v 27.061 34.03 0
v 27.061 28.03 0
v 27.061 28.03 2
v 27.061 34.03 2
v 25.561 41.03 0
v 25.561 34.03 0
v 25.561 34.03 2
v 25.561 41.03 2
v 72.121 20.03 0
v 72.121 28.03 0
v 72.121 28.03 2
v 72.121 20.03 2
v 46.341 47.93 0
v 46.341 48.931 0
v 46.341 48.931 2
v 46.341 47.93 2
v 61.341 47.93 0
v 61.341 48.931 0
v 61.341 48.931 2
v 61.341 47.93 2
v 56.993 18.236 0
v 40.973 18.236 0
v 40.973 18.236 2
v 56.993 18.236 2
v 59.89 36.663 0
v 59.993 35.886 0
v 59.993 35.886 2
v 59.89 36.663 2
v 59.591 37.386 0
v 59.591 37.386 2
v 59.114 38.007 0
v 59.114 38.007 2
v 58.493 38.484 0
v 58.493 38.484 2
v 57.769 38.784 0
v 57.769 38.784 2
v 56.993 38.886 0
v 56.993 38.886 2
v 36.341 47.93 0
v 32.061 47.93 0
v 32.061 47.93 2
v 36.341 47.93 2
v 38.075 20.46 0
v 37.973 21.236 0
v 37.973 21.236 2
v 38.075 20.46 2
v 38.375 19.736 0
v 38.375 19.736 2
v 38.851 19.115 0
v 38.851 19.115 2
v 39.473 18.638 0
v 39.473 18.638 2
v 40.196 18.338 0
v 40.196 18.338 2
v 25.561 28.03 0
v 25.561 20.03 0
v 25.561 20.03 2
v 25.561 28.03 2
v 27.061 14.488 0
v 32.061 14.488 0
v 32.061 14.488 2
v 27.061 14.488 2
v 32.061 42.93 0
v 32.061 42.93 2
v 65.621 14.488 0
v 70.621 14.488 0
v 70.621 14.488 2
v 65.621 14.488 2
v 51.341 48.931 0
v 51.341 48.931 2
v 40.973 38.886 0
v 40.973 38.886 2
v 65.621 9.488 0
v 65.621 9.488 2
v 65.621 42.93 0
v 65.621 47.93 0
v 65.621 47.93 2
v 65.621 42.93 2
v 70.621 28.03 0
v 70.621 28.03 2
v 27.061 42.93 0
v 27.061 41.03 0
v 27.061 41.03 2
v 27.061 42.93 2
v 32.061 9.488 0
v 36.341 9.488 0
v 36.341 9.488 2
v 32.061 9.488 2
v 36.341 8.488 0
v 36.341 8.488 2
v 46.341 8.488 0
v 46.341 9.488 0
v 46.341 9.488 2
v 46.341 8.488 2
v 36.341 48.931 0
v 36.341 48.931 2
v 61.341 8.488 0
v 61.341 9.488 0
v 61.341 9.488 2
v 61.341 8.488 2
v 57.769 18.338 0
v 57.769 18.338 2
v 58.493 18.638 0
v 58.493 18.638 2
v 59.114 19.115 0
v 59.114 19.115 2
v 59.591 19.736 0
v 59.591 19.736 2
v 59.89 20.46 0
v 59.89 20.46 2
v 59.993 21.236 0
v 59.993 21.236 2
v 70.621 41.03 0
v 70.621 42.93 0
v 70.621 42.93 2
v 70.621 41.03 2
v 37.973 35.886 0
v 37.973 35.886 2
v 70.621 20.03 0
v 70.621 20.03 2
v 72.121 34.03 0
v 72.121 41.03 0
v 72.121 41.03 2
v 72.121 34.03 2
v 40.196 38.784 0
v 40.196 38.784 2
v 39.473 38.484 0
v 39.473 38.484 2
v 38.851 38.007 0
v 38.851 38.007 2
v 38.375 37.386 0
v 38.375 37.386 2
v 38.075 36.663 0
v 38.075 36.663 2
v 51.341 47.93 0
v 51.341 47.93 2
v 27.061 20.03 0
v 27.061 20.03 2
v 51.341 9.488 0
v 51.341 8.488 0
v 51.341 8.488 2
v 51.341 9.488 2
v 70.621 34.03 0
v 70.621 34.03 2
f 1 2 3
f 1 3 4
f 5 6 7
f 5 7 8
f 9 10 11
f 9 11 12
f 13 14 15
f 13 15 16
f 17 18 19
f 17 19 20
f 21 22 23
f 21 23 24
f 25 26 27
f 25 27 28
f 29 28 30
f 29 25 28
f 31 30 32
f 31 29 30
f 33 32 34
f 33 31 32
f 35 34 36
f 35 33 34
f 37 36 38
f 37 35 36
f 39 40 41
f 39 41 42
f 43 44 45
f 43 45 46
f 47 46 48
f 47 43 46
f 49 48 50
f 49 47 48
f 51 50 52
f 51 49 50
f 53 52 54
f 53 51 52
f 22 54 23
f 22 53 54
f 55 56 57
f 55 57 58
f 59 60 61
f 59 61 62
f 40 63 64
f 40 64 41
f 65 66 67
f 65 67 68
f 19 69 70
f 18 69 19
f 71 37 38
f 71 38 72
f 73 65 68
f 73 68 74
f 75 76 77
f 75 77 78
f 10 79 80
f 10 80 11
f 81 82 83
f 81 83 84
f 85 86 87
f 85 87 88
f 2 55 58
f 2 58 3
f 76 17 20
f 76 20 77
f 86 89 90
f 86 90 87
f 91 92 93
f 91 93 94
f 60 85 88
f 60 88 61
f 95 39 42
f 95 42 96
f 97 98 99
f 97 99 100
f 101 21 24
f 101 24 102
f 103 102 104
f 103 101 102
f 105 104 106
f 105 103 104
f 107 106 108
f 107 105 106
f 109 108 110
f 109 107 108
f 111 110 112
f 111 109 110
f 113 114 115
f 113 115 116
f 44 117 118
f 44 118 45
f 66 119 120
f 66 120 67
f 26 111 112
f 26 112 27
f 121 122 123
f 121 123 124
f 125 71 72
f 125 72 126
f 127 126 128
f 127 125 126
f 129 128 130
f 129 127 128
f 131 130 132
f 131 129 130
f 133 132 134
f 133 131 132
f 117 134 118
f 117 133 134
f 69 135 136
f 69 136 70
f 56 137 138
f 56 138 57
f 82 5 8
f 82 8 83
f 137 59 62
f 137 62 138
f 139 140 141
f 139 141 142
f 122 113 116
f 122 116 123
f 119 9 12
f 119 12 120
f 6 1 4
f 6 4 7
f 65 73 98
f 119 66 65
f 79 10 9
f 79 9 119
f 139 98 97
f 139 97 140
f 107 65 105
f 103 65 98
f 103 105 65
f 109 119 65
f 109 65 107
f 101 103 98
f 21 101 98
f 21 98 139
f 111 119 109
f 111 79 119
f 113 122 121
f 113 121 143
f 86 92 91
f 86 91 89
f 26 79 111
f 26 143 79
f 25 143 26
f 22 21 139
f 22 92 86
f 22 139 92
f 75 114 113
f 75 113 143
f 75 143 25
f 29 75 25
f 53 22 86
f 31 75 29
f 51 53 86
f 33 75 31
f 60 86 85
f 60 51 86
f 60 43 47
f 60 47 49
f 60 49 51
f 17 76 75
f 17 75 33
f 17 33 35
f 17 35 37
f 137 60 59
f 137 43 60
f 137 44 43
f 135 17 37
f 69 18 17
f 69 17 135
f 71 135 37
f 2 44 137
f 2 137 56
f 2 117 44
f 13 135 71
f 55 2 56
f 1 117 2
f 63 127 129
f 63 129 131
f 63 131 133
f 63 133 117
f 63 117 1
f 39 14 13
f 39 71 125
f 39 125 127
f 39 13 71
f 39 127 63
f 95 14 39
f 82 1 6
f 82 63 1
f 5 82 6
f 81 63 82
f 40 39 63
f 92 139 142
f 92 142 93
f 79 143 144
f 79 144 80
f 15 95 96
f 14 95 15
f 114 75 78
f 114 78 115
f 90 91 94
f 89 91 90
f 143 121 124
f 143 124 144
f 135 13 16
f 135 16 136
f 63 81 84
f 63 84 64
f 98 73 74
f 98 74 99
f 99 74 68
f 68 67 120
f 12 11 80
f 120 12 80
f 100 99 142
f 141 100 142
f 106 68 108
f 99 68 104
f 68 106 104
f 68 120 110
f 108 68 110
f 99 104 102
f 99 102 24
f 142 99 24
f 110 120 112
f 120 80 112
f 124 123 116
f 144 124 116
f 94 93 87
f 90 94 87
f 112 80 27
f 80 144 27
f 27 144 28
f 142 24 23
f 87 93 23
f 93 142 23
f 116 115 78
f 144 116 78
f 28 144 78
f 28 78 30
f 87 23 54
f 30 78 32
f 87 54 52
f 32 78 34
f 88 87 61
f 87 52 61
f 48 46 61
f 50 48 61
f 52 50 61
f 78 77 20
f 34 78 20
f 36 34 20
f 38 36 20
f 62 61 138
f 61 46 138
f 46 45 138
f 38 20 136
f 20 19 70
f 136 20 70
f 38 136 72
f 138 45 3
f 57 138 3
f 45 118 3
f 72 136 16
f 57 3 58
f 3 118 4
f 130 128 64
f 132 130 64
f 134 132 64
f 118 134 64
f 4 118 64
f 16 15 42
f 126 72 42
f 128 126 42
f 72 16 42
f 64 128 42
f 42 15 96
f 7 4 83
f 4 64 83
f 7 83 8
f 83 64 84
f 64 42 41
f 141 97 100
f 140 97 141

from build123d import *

# Parameters (mm, degrees)
EXTRUDE_1_DEPTH = 2


with BuildPart() as part:
    # Model → 凸台-拉伸1 (new body)
    with BuildSketch(Plane.XY):
        Polygon((32.060999065, 47.930306361), (36.340999065, 47.930306361), (36.340999065, 48.930662067), (46.340999065, 48.930662067), (46.340999065, 47.930306361), (51.340999065, 47.930306361), (51.340999065, 48.930662067), (61.340999065, 48.930662067), (61.340999065, 47.930306361), (65.620999065, 47.930306361), (65.620999065, 42.930306361), (70.620999065, 42.930306361), (70.620999065, 41.030306361), (72.120999065, 41.030306361), (72.120999065, 34.030306361), (70.620999065, 34.030306361), (70.620999065, 28.030306361), (72.120999065, 28.030306361), (72.120999065, 20.030306361), (70.620999065, 20.030306361), (70.620999065, 14.488230775), (65.620999065, 14.488230775), (65.620999065, 9.488230775), (61.340999065, 9.488230775), (61.340999065, 8.487875069), (51.340999065, 8.487875069), (51.340999065, 9.488230775), (46.340999065, 9.488230775), (46.340999065, 8.487875069), (36.340999065, 8.487875069), (36.340999065, 9.488230775), (32.060999065, 9.488230775), (32.060999065, 14.488230775), (27.060999065, 14.488230775), (27.060999065, 20.030306361), (25.560999065, 20.030306361), (25.560999065, 28.030306361), (27.060999065, 28.030306361), (27.060999065, 34.030306361), (25.560999065, 34.030306361), (25.560999065, 41.030306361), (27.060999065, 41.030306361), (27.060999065, 42.930306361), (32.060999065, 42.930306361), align=None)
        with BuildLine():
            Line((56.992719614, 38.886063343), (40.972719614, 38.886063343))
            ThreePointArc((40.972719614, 38.886063343), (38.85139927, 38.007383686), (37.972719614, 35.886063343))
            Line((37.972719614, 35.886063343), (37.972719614, 21.236063342))
            ThreePointArc((37.972719614, 21.236063342), (38.85139927, 19.114742999), (40.972719614, 18.236063342))
            Line((40.972719614, 18.236063342), (56.992719614, 18.236063342))
            ThreePointArc((56.992719614, 18.236063342), (59.114039957, 19.114742999), (59.992719614, 21.236063342))
            Line((59.992719614, 21.236063342), (59.992719614, 35.886063343))
            ThreePointArc((59.992719614, 35.886063343), (59.114039957, 38.007383686), (56.992719614, 38.886063343))
        make_face(mode=Mode.SUBTRACT)
    extrude(amount=EXTRUDE_1_DEPTH)


solid = part.part
